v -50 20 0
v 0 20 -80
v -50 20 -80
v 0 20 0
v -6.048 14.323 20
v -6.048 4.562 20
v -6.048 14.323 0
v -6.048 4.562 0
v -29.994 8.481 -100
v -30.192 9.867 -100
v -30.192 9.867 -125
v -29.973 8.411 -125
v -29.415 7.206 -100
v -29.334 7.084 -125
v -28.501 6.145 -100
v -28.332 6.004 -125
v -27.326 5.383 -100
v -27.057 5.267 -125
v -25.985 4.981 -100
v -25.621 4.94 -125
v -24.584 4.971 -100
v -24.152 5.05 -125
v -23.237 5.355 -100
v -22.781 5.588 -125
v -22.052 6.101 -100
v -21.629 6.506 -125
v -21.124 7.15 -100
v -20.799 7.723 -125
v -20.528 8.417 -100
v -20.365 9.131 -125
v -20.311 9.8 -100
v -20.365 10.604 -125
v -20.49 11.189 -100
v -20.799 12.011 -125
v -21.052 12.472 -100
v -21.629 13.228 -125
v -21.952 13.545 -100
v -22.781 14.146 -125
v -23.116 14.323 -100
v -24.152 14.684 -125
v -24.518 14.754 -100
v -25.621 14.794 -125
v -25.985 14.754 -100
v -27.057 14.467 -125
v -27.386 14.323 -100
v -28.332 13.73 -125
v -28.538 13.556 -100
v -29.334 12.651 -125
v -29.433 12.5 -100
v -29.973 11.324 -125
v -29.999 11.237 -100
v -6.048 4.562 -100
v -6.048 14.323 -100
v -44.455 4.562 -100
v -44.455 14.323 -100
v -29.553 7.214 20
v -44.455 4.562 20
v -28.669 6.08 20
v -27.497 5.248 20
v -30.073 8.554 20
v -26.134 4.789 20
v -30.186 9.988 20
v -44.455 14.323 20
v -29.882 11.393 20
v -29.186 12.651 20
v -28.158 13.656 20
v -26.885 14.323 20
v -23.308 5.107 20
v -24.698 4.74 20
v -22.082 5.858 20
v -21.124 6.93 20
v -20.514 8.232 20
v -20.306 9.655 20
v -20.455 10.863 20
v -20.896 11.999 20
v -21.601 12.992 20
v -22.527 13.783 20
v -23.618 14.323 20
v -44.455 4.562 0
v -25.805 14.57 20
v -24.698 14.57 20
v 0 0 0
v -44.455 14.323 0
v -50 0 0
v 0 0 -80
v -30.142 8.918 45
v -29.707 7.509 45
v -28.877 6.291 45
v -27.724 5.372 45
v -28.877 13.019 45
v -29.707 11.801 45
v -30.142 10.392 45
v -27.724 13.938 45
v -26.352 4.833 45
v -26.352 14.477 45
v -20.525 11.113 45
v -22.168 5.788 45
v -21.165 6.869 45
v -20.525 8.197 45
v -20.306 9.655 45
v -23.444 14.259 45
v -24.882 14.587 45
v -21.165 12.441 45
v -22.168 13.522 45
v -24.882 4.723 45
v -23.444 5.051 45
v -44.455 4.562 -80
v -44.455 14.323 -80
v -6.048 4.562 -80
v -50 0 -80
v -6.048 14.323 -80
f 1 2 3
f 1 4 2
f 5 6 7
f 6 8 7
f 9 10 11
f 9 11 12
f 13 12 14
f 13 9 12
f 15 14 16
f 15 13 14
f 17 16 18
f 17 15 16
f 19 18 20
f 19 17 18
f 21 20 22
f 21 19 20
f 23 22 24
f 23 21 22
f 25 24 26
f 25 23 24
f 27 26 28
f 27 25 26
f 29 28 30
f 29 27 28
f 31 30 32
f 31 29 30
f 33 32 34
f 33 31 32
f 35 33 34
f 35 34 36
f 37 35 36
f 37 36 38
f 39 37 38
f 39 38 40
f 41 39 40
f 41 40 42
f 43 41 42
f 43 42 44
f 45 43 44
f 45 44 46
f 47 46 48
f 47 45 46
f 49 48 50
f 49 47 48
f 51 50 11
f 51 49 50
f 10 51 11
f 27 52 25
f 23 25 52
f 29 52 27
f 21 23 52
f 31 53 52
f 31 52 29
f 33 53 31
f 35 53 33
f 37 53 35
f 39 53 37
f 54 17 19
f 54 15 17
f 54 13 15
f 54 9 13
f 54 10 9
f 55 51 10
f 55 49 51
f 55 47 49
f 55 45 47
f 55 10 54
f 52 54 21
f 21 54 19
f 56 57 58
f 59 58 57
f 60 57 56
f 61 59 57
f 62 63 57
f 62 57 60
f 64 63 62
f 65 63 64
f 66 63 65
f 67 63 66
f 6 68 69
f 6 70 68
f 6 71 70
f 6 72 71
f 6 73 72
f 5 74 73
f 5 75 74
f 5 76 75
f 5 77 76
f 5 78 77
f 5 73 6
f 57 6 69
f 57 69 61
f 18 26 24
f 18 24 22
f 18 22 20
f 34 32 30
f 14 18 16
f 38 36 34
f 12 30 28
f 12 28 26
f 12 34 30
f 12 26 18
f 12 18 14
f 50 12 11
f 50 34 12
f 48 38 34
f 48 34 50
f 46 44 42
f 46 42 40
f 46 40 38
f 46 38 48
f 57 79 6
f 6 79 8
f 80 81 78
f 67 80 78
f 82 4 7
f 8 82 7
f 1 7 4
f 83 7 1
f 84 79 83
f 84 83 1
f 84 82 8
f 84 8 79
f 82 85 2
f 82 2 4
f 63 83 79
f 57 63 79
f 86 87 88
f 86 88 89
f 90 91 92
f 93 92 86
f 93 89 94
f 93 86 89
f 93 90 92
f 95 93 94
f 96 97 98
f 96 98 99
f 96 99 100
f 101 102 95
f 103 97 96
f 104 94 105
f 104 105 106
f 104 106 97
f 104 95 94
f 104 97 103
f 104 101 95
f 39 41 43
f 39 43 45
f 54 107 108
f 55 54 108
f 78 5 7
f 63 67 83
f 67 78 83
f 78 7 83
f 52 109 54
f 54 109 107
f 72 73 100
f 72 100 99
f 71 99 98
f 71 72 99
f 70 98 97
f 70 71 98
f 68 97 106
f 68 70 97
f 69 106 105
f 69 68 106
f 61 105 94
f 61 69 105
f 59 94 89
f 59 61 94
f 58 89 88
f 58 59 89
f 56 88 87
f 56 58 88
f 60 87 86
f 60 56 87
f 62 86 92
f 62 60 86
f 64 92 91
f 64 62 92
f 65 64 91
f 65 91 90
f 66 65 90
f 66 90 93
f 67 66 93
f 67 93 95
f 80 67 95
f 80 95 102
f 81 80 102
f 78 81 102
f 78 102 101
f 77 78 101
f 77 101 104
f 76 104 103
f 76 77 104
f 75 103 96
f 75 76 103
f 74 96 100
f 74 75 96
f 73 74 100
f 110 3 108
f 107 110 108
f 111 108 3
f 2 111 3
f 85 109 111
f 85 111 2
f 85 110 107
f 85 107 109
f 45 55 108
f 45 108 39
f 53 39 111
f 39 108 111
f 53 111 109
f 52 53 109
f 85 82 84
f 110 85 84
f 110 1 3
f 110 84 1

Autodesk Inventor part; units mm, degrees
ref_plane "YZ Plane" through (0, 0, 0) normal (1, 0, 0) x (0, 1, 0)
ref_plane "XZ Plane" through (0, 0, 0) normal (0, 1, 0) x (-1, 0, 0)
ref_plane "XY Plane" through (0, 0, 0) normal (0, 0, 1) x (1, 0, 0)
sketch "Sketch1" plane through (0, 0, 0) normal (0, 1, 0) x (-1, 0, 0)
  line L0 (0, 0) -> (50, 0)
  line L1 (50, 0) -> (50, -80)
  line L2 (50, -80) -> (0, -80)
  line L3 (0, -80) -> (0, 0)
  dimension "d0" = 80
  dimension "d1" = 50
extrude "Extrusion1" add sketch "Sketch1" along normal blind 20
sketch "Sketch2" plane through (-50, 0, 0) normal (0, 0, 1) x (1, 0, 0)
  line L0 (5.545, 4.5622) -> (43.9524, 4.5622)
  line L1 (43.9524, 4.5622) -> (43.9524, 14.3232)
  line L2 (43.9524, 14.3232) -> (5.545, 14.3232)
  line L3 (5.545, 14.3232) -> (5.545, 4.5622)
  point P0 (50, 0)
extrude "Extrusion2" add sketch "Sketch2" along normal blind 20
sketch "Sketch3" plane through (0, 0, -80) normal (0, 0, -1) x (-1, 0, 0)
  line L0 (44.455, 14.3232) -> (6.0476, 14.3232) projected
  line L1 (6.0476, 4.5622) -> (44.455, 4.5622) projected
  line L2 (44.455, 14.3232) -> (6.0476, 14.3232)
  line L3 (6.0476, 14.3232) -> (6.0476, 4.5622)
  line L4 (6.0476, 4.5622) -> (44.455, 4.5622)
  line L5 (44.455, 4.5622) -> (44.455, 14.3232)
  point P0 (0, 0)
  point P1 (6.0476, 14.3232)
extrude "Extrusion3" add sketch "Sketch3" along normal blind 20
sketch "Sketch4" plane through (0, 0, -100) normal (0, 0, -1) x (-1, 0, 0)
  circle A0 centre (25.2513, 9.8671) radius 4.9412
  point P0 (0, 0)
extrude "Extrusion4" add sketch "Sketch4" along normal blind 25
sketch "Sketch5" plane through (-50, 0, 20) normal (0, 0, 1) x (1, 0, 0)
  circle A0 centre (24.7487, 9.6549) radius 4.9458
  point P0 (50, 0)
extrude "Extrusion5" add sketch "Sketch5" along normal blind 25
sketch "Sketch6" plane through (0, 20, 0) normal (0, 1, 0) x (1, 0, 0)
  line L0 (-33.19, 13.0471) -> (-33.19, 67.4667) construction
  line L1 (-33.19, 67.4667) -> (-19.8135, 67.4667) construction
  line L2 (-19.8135, 67.4667) -> (-19.8135, 13.0471) construction
  line L3 (-19.8135, 13.0471) -> (-33.19, 13.0471) construction
  point P0 (0, 0)
properties part number "tilt now"
